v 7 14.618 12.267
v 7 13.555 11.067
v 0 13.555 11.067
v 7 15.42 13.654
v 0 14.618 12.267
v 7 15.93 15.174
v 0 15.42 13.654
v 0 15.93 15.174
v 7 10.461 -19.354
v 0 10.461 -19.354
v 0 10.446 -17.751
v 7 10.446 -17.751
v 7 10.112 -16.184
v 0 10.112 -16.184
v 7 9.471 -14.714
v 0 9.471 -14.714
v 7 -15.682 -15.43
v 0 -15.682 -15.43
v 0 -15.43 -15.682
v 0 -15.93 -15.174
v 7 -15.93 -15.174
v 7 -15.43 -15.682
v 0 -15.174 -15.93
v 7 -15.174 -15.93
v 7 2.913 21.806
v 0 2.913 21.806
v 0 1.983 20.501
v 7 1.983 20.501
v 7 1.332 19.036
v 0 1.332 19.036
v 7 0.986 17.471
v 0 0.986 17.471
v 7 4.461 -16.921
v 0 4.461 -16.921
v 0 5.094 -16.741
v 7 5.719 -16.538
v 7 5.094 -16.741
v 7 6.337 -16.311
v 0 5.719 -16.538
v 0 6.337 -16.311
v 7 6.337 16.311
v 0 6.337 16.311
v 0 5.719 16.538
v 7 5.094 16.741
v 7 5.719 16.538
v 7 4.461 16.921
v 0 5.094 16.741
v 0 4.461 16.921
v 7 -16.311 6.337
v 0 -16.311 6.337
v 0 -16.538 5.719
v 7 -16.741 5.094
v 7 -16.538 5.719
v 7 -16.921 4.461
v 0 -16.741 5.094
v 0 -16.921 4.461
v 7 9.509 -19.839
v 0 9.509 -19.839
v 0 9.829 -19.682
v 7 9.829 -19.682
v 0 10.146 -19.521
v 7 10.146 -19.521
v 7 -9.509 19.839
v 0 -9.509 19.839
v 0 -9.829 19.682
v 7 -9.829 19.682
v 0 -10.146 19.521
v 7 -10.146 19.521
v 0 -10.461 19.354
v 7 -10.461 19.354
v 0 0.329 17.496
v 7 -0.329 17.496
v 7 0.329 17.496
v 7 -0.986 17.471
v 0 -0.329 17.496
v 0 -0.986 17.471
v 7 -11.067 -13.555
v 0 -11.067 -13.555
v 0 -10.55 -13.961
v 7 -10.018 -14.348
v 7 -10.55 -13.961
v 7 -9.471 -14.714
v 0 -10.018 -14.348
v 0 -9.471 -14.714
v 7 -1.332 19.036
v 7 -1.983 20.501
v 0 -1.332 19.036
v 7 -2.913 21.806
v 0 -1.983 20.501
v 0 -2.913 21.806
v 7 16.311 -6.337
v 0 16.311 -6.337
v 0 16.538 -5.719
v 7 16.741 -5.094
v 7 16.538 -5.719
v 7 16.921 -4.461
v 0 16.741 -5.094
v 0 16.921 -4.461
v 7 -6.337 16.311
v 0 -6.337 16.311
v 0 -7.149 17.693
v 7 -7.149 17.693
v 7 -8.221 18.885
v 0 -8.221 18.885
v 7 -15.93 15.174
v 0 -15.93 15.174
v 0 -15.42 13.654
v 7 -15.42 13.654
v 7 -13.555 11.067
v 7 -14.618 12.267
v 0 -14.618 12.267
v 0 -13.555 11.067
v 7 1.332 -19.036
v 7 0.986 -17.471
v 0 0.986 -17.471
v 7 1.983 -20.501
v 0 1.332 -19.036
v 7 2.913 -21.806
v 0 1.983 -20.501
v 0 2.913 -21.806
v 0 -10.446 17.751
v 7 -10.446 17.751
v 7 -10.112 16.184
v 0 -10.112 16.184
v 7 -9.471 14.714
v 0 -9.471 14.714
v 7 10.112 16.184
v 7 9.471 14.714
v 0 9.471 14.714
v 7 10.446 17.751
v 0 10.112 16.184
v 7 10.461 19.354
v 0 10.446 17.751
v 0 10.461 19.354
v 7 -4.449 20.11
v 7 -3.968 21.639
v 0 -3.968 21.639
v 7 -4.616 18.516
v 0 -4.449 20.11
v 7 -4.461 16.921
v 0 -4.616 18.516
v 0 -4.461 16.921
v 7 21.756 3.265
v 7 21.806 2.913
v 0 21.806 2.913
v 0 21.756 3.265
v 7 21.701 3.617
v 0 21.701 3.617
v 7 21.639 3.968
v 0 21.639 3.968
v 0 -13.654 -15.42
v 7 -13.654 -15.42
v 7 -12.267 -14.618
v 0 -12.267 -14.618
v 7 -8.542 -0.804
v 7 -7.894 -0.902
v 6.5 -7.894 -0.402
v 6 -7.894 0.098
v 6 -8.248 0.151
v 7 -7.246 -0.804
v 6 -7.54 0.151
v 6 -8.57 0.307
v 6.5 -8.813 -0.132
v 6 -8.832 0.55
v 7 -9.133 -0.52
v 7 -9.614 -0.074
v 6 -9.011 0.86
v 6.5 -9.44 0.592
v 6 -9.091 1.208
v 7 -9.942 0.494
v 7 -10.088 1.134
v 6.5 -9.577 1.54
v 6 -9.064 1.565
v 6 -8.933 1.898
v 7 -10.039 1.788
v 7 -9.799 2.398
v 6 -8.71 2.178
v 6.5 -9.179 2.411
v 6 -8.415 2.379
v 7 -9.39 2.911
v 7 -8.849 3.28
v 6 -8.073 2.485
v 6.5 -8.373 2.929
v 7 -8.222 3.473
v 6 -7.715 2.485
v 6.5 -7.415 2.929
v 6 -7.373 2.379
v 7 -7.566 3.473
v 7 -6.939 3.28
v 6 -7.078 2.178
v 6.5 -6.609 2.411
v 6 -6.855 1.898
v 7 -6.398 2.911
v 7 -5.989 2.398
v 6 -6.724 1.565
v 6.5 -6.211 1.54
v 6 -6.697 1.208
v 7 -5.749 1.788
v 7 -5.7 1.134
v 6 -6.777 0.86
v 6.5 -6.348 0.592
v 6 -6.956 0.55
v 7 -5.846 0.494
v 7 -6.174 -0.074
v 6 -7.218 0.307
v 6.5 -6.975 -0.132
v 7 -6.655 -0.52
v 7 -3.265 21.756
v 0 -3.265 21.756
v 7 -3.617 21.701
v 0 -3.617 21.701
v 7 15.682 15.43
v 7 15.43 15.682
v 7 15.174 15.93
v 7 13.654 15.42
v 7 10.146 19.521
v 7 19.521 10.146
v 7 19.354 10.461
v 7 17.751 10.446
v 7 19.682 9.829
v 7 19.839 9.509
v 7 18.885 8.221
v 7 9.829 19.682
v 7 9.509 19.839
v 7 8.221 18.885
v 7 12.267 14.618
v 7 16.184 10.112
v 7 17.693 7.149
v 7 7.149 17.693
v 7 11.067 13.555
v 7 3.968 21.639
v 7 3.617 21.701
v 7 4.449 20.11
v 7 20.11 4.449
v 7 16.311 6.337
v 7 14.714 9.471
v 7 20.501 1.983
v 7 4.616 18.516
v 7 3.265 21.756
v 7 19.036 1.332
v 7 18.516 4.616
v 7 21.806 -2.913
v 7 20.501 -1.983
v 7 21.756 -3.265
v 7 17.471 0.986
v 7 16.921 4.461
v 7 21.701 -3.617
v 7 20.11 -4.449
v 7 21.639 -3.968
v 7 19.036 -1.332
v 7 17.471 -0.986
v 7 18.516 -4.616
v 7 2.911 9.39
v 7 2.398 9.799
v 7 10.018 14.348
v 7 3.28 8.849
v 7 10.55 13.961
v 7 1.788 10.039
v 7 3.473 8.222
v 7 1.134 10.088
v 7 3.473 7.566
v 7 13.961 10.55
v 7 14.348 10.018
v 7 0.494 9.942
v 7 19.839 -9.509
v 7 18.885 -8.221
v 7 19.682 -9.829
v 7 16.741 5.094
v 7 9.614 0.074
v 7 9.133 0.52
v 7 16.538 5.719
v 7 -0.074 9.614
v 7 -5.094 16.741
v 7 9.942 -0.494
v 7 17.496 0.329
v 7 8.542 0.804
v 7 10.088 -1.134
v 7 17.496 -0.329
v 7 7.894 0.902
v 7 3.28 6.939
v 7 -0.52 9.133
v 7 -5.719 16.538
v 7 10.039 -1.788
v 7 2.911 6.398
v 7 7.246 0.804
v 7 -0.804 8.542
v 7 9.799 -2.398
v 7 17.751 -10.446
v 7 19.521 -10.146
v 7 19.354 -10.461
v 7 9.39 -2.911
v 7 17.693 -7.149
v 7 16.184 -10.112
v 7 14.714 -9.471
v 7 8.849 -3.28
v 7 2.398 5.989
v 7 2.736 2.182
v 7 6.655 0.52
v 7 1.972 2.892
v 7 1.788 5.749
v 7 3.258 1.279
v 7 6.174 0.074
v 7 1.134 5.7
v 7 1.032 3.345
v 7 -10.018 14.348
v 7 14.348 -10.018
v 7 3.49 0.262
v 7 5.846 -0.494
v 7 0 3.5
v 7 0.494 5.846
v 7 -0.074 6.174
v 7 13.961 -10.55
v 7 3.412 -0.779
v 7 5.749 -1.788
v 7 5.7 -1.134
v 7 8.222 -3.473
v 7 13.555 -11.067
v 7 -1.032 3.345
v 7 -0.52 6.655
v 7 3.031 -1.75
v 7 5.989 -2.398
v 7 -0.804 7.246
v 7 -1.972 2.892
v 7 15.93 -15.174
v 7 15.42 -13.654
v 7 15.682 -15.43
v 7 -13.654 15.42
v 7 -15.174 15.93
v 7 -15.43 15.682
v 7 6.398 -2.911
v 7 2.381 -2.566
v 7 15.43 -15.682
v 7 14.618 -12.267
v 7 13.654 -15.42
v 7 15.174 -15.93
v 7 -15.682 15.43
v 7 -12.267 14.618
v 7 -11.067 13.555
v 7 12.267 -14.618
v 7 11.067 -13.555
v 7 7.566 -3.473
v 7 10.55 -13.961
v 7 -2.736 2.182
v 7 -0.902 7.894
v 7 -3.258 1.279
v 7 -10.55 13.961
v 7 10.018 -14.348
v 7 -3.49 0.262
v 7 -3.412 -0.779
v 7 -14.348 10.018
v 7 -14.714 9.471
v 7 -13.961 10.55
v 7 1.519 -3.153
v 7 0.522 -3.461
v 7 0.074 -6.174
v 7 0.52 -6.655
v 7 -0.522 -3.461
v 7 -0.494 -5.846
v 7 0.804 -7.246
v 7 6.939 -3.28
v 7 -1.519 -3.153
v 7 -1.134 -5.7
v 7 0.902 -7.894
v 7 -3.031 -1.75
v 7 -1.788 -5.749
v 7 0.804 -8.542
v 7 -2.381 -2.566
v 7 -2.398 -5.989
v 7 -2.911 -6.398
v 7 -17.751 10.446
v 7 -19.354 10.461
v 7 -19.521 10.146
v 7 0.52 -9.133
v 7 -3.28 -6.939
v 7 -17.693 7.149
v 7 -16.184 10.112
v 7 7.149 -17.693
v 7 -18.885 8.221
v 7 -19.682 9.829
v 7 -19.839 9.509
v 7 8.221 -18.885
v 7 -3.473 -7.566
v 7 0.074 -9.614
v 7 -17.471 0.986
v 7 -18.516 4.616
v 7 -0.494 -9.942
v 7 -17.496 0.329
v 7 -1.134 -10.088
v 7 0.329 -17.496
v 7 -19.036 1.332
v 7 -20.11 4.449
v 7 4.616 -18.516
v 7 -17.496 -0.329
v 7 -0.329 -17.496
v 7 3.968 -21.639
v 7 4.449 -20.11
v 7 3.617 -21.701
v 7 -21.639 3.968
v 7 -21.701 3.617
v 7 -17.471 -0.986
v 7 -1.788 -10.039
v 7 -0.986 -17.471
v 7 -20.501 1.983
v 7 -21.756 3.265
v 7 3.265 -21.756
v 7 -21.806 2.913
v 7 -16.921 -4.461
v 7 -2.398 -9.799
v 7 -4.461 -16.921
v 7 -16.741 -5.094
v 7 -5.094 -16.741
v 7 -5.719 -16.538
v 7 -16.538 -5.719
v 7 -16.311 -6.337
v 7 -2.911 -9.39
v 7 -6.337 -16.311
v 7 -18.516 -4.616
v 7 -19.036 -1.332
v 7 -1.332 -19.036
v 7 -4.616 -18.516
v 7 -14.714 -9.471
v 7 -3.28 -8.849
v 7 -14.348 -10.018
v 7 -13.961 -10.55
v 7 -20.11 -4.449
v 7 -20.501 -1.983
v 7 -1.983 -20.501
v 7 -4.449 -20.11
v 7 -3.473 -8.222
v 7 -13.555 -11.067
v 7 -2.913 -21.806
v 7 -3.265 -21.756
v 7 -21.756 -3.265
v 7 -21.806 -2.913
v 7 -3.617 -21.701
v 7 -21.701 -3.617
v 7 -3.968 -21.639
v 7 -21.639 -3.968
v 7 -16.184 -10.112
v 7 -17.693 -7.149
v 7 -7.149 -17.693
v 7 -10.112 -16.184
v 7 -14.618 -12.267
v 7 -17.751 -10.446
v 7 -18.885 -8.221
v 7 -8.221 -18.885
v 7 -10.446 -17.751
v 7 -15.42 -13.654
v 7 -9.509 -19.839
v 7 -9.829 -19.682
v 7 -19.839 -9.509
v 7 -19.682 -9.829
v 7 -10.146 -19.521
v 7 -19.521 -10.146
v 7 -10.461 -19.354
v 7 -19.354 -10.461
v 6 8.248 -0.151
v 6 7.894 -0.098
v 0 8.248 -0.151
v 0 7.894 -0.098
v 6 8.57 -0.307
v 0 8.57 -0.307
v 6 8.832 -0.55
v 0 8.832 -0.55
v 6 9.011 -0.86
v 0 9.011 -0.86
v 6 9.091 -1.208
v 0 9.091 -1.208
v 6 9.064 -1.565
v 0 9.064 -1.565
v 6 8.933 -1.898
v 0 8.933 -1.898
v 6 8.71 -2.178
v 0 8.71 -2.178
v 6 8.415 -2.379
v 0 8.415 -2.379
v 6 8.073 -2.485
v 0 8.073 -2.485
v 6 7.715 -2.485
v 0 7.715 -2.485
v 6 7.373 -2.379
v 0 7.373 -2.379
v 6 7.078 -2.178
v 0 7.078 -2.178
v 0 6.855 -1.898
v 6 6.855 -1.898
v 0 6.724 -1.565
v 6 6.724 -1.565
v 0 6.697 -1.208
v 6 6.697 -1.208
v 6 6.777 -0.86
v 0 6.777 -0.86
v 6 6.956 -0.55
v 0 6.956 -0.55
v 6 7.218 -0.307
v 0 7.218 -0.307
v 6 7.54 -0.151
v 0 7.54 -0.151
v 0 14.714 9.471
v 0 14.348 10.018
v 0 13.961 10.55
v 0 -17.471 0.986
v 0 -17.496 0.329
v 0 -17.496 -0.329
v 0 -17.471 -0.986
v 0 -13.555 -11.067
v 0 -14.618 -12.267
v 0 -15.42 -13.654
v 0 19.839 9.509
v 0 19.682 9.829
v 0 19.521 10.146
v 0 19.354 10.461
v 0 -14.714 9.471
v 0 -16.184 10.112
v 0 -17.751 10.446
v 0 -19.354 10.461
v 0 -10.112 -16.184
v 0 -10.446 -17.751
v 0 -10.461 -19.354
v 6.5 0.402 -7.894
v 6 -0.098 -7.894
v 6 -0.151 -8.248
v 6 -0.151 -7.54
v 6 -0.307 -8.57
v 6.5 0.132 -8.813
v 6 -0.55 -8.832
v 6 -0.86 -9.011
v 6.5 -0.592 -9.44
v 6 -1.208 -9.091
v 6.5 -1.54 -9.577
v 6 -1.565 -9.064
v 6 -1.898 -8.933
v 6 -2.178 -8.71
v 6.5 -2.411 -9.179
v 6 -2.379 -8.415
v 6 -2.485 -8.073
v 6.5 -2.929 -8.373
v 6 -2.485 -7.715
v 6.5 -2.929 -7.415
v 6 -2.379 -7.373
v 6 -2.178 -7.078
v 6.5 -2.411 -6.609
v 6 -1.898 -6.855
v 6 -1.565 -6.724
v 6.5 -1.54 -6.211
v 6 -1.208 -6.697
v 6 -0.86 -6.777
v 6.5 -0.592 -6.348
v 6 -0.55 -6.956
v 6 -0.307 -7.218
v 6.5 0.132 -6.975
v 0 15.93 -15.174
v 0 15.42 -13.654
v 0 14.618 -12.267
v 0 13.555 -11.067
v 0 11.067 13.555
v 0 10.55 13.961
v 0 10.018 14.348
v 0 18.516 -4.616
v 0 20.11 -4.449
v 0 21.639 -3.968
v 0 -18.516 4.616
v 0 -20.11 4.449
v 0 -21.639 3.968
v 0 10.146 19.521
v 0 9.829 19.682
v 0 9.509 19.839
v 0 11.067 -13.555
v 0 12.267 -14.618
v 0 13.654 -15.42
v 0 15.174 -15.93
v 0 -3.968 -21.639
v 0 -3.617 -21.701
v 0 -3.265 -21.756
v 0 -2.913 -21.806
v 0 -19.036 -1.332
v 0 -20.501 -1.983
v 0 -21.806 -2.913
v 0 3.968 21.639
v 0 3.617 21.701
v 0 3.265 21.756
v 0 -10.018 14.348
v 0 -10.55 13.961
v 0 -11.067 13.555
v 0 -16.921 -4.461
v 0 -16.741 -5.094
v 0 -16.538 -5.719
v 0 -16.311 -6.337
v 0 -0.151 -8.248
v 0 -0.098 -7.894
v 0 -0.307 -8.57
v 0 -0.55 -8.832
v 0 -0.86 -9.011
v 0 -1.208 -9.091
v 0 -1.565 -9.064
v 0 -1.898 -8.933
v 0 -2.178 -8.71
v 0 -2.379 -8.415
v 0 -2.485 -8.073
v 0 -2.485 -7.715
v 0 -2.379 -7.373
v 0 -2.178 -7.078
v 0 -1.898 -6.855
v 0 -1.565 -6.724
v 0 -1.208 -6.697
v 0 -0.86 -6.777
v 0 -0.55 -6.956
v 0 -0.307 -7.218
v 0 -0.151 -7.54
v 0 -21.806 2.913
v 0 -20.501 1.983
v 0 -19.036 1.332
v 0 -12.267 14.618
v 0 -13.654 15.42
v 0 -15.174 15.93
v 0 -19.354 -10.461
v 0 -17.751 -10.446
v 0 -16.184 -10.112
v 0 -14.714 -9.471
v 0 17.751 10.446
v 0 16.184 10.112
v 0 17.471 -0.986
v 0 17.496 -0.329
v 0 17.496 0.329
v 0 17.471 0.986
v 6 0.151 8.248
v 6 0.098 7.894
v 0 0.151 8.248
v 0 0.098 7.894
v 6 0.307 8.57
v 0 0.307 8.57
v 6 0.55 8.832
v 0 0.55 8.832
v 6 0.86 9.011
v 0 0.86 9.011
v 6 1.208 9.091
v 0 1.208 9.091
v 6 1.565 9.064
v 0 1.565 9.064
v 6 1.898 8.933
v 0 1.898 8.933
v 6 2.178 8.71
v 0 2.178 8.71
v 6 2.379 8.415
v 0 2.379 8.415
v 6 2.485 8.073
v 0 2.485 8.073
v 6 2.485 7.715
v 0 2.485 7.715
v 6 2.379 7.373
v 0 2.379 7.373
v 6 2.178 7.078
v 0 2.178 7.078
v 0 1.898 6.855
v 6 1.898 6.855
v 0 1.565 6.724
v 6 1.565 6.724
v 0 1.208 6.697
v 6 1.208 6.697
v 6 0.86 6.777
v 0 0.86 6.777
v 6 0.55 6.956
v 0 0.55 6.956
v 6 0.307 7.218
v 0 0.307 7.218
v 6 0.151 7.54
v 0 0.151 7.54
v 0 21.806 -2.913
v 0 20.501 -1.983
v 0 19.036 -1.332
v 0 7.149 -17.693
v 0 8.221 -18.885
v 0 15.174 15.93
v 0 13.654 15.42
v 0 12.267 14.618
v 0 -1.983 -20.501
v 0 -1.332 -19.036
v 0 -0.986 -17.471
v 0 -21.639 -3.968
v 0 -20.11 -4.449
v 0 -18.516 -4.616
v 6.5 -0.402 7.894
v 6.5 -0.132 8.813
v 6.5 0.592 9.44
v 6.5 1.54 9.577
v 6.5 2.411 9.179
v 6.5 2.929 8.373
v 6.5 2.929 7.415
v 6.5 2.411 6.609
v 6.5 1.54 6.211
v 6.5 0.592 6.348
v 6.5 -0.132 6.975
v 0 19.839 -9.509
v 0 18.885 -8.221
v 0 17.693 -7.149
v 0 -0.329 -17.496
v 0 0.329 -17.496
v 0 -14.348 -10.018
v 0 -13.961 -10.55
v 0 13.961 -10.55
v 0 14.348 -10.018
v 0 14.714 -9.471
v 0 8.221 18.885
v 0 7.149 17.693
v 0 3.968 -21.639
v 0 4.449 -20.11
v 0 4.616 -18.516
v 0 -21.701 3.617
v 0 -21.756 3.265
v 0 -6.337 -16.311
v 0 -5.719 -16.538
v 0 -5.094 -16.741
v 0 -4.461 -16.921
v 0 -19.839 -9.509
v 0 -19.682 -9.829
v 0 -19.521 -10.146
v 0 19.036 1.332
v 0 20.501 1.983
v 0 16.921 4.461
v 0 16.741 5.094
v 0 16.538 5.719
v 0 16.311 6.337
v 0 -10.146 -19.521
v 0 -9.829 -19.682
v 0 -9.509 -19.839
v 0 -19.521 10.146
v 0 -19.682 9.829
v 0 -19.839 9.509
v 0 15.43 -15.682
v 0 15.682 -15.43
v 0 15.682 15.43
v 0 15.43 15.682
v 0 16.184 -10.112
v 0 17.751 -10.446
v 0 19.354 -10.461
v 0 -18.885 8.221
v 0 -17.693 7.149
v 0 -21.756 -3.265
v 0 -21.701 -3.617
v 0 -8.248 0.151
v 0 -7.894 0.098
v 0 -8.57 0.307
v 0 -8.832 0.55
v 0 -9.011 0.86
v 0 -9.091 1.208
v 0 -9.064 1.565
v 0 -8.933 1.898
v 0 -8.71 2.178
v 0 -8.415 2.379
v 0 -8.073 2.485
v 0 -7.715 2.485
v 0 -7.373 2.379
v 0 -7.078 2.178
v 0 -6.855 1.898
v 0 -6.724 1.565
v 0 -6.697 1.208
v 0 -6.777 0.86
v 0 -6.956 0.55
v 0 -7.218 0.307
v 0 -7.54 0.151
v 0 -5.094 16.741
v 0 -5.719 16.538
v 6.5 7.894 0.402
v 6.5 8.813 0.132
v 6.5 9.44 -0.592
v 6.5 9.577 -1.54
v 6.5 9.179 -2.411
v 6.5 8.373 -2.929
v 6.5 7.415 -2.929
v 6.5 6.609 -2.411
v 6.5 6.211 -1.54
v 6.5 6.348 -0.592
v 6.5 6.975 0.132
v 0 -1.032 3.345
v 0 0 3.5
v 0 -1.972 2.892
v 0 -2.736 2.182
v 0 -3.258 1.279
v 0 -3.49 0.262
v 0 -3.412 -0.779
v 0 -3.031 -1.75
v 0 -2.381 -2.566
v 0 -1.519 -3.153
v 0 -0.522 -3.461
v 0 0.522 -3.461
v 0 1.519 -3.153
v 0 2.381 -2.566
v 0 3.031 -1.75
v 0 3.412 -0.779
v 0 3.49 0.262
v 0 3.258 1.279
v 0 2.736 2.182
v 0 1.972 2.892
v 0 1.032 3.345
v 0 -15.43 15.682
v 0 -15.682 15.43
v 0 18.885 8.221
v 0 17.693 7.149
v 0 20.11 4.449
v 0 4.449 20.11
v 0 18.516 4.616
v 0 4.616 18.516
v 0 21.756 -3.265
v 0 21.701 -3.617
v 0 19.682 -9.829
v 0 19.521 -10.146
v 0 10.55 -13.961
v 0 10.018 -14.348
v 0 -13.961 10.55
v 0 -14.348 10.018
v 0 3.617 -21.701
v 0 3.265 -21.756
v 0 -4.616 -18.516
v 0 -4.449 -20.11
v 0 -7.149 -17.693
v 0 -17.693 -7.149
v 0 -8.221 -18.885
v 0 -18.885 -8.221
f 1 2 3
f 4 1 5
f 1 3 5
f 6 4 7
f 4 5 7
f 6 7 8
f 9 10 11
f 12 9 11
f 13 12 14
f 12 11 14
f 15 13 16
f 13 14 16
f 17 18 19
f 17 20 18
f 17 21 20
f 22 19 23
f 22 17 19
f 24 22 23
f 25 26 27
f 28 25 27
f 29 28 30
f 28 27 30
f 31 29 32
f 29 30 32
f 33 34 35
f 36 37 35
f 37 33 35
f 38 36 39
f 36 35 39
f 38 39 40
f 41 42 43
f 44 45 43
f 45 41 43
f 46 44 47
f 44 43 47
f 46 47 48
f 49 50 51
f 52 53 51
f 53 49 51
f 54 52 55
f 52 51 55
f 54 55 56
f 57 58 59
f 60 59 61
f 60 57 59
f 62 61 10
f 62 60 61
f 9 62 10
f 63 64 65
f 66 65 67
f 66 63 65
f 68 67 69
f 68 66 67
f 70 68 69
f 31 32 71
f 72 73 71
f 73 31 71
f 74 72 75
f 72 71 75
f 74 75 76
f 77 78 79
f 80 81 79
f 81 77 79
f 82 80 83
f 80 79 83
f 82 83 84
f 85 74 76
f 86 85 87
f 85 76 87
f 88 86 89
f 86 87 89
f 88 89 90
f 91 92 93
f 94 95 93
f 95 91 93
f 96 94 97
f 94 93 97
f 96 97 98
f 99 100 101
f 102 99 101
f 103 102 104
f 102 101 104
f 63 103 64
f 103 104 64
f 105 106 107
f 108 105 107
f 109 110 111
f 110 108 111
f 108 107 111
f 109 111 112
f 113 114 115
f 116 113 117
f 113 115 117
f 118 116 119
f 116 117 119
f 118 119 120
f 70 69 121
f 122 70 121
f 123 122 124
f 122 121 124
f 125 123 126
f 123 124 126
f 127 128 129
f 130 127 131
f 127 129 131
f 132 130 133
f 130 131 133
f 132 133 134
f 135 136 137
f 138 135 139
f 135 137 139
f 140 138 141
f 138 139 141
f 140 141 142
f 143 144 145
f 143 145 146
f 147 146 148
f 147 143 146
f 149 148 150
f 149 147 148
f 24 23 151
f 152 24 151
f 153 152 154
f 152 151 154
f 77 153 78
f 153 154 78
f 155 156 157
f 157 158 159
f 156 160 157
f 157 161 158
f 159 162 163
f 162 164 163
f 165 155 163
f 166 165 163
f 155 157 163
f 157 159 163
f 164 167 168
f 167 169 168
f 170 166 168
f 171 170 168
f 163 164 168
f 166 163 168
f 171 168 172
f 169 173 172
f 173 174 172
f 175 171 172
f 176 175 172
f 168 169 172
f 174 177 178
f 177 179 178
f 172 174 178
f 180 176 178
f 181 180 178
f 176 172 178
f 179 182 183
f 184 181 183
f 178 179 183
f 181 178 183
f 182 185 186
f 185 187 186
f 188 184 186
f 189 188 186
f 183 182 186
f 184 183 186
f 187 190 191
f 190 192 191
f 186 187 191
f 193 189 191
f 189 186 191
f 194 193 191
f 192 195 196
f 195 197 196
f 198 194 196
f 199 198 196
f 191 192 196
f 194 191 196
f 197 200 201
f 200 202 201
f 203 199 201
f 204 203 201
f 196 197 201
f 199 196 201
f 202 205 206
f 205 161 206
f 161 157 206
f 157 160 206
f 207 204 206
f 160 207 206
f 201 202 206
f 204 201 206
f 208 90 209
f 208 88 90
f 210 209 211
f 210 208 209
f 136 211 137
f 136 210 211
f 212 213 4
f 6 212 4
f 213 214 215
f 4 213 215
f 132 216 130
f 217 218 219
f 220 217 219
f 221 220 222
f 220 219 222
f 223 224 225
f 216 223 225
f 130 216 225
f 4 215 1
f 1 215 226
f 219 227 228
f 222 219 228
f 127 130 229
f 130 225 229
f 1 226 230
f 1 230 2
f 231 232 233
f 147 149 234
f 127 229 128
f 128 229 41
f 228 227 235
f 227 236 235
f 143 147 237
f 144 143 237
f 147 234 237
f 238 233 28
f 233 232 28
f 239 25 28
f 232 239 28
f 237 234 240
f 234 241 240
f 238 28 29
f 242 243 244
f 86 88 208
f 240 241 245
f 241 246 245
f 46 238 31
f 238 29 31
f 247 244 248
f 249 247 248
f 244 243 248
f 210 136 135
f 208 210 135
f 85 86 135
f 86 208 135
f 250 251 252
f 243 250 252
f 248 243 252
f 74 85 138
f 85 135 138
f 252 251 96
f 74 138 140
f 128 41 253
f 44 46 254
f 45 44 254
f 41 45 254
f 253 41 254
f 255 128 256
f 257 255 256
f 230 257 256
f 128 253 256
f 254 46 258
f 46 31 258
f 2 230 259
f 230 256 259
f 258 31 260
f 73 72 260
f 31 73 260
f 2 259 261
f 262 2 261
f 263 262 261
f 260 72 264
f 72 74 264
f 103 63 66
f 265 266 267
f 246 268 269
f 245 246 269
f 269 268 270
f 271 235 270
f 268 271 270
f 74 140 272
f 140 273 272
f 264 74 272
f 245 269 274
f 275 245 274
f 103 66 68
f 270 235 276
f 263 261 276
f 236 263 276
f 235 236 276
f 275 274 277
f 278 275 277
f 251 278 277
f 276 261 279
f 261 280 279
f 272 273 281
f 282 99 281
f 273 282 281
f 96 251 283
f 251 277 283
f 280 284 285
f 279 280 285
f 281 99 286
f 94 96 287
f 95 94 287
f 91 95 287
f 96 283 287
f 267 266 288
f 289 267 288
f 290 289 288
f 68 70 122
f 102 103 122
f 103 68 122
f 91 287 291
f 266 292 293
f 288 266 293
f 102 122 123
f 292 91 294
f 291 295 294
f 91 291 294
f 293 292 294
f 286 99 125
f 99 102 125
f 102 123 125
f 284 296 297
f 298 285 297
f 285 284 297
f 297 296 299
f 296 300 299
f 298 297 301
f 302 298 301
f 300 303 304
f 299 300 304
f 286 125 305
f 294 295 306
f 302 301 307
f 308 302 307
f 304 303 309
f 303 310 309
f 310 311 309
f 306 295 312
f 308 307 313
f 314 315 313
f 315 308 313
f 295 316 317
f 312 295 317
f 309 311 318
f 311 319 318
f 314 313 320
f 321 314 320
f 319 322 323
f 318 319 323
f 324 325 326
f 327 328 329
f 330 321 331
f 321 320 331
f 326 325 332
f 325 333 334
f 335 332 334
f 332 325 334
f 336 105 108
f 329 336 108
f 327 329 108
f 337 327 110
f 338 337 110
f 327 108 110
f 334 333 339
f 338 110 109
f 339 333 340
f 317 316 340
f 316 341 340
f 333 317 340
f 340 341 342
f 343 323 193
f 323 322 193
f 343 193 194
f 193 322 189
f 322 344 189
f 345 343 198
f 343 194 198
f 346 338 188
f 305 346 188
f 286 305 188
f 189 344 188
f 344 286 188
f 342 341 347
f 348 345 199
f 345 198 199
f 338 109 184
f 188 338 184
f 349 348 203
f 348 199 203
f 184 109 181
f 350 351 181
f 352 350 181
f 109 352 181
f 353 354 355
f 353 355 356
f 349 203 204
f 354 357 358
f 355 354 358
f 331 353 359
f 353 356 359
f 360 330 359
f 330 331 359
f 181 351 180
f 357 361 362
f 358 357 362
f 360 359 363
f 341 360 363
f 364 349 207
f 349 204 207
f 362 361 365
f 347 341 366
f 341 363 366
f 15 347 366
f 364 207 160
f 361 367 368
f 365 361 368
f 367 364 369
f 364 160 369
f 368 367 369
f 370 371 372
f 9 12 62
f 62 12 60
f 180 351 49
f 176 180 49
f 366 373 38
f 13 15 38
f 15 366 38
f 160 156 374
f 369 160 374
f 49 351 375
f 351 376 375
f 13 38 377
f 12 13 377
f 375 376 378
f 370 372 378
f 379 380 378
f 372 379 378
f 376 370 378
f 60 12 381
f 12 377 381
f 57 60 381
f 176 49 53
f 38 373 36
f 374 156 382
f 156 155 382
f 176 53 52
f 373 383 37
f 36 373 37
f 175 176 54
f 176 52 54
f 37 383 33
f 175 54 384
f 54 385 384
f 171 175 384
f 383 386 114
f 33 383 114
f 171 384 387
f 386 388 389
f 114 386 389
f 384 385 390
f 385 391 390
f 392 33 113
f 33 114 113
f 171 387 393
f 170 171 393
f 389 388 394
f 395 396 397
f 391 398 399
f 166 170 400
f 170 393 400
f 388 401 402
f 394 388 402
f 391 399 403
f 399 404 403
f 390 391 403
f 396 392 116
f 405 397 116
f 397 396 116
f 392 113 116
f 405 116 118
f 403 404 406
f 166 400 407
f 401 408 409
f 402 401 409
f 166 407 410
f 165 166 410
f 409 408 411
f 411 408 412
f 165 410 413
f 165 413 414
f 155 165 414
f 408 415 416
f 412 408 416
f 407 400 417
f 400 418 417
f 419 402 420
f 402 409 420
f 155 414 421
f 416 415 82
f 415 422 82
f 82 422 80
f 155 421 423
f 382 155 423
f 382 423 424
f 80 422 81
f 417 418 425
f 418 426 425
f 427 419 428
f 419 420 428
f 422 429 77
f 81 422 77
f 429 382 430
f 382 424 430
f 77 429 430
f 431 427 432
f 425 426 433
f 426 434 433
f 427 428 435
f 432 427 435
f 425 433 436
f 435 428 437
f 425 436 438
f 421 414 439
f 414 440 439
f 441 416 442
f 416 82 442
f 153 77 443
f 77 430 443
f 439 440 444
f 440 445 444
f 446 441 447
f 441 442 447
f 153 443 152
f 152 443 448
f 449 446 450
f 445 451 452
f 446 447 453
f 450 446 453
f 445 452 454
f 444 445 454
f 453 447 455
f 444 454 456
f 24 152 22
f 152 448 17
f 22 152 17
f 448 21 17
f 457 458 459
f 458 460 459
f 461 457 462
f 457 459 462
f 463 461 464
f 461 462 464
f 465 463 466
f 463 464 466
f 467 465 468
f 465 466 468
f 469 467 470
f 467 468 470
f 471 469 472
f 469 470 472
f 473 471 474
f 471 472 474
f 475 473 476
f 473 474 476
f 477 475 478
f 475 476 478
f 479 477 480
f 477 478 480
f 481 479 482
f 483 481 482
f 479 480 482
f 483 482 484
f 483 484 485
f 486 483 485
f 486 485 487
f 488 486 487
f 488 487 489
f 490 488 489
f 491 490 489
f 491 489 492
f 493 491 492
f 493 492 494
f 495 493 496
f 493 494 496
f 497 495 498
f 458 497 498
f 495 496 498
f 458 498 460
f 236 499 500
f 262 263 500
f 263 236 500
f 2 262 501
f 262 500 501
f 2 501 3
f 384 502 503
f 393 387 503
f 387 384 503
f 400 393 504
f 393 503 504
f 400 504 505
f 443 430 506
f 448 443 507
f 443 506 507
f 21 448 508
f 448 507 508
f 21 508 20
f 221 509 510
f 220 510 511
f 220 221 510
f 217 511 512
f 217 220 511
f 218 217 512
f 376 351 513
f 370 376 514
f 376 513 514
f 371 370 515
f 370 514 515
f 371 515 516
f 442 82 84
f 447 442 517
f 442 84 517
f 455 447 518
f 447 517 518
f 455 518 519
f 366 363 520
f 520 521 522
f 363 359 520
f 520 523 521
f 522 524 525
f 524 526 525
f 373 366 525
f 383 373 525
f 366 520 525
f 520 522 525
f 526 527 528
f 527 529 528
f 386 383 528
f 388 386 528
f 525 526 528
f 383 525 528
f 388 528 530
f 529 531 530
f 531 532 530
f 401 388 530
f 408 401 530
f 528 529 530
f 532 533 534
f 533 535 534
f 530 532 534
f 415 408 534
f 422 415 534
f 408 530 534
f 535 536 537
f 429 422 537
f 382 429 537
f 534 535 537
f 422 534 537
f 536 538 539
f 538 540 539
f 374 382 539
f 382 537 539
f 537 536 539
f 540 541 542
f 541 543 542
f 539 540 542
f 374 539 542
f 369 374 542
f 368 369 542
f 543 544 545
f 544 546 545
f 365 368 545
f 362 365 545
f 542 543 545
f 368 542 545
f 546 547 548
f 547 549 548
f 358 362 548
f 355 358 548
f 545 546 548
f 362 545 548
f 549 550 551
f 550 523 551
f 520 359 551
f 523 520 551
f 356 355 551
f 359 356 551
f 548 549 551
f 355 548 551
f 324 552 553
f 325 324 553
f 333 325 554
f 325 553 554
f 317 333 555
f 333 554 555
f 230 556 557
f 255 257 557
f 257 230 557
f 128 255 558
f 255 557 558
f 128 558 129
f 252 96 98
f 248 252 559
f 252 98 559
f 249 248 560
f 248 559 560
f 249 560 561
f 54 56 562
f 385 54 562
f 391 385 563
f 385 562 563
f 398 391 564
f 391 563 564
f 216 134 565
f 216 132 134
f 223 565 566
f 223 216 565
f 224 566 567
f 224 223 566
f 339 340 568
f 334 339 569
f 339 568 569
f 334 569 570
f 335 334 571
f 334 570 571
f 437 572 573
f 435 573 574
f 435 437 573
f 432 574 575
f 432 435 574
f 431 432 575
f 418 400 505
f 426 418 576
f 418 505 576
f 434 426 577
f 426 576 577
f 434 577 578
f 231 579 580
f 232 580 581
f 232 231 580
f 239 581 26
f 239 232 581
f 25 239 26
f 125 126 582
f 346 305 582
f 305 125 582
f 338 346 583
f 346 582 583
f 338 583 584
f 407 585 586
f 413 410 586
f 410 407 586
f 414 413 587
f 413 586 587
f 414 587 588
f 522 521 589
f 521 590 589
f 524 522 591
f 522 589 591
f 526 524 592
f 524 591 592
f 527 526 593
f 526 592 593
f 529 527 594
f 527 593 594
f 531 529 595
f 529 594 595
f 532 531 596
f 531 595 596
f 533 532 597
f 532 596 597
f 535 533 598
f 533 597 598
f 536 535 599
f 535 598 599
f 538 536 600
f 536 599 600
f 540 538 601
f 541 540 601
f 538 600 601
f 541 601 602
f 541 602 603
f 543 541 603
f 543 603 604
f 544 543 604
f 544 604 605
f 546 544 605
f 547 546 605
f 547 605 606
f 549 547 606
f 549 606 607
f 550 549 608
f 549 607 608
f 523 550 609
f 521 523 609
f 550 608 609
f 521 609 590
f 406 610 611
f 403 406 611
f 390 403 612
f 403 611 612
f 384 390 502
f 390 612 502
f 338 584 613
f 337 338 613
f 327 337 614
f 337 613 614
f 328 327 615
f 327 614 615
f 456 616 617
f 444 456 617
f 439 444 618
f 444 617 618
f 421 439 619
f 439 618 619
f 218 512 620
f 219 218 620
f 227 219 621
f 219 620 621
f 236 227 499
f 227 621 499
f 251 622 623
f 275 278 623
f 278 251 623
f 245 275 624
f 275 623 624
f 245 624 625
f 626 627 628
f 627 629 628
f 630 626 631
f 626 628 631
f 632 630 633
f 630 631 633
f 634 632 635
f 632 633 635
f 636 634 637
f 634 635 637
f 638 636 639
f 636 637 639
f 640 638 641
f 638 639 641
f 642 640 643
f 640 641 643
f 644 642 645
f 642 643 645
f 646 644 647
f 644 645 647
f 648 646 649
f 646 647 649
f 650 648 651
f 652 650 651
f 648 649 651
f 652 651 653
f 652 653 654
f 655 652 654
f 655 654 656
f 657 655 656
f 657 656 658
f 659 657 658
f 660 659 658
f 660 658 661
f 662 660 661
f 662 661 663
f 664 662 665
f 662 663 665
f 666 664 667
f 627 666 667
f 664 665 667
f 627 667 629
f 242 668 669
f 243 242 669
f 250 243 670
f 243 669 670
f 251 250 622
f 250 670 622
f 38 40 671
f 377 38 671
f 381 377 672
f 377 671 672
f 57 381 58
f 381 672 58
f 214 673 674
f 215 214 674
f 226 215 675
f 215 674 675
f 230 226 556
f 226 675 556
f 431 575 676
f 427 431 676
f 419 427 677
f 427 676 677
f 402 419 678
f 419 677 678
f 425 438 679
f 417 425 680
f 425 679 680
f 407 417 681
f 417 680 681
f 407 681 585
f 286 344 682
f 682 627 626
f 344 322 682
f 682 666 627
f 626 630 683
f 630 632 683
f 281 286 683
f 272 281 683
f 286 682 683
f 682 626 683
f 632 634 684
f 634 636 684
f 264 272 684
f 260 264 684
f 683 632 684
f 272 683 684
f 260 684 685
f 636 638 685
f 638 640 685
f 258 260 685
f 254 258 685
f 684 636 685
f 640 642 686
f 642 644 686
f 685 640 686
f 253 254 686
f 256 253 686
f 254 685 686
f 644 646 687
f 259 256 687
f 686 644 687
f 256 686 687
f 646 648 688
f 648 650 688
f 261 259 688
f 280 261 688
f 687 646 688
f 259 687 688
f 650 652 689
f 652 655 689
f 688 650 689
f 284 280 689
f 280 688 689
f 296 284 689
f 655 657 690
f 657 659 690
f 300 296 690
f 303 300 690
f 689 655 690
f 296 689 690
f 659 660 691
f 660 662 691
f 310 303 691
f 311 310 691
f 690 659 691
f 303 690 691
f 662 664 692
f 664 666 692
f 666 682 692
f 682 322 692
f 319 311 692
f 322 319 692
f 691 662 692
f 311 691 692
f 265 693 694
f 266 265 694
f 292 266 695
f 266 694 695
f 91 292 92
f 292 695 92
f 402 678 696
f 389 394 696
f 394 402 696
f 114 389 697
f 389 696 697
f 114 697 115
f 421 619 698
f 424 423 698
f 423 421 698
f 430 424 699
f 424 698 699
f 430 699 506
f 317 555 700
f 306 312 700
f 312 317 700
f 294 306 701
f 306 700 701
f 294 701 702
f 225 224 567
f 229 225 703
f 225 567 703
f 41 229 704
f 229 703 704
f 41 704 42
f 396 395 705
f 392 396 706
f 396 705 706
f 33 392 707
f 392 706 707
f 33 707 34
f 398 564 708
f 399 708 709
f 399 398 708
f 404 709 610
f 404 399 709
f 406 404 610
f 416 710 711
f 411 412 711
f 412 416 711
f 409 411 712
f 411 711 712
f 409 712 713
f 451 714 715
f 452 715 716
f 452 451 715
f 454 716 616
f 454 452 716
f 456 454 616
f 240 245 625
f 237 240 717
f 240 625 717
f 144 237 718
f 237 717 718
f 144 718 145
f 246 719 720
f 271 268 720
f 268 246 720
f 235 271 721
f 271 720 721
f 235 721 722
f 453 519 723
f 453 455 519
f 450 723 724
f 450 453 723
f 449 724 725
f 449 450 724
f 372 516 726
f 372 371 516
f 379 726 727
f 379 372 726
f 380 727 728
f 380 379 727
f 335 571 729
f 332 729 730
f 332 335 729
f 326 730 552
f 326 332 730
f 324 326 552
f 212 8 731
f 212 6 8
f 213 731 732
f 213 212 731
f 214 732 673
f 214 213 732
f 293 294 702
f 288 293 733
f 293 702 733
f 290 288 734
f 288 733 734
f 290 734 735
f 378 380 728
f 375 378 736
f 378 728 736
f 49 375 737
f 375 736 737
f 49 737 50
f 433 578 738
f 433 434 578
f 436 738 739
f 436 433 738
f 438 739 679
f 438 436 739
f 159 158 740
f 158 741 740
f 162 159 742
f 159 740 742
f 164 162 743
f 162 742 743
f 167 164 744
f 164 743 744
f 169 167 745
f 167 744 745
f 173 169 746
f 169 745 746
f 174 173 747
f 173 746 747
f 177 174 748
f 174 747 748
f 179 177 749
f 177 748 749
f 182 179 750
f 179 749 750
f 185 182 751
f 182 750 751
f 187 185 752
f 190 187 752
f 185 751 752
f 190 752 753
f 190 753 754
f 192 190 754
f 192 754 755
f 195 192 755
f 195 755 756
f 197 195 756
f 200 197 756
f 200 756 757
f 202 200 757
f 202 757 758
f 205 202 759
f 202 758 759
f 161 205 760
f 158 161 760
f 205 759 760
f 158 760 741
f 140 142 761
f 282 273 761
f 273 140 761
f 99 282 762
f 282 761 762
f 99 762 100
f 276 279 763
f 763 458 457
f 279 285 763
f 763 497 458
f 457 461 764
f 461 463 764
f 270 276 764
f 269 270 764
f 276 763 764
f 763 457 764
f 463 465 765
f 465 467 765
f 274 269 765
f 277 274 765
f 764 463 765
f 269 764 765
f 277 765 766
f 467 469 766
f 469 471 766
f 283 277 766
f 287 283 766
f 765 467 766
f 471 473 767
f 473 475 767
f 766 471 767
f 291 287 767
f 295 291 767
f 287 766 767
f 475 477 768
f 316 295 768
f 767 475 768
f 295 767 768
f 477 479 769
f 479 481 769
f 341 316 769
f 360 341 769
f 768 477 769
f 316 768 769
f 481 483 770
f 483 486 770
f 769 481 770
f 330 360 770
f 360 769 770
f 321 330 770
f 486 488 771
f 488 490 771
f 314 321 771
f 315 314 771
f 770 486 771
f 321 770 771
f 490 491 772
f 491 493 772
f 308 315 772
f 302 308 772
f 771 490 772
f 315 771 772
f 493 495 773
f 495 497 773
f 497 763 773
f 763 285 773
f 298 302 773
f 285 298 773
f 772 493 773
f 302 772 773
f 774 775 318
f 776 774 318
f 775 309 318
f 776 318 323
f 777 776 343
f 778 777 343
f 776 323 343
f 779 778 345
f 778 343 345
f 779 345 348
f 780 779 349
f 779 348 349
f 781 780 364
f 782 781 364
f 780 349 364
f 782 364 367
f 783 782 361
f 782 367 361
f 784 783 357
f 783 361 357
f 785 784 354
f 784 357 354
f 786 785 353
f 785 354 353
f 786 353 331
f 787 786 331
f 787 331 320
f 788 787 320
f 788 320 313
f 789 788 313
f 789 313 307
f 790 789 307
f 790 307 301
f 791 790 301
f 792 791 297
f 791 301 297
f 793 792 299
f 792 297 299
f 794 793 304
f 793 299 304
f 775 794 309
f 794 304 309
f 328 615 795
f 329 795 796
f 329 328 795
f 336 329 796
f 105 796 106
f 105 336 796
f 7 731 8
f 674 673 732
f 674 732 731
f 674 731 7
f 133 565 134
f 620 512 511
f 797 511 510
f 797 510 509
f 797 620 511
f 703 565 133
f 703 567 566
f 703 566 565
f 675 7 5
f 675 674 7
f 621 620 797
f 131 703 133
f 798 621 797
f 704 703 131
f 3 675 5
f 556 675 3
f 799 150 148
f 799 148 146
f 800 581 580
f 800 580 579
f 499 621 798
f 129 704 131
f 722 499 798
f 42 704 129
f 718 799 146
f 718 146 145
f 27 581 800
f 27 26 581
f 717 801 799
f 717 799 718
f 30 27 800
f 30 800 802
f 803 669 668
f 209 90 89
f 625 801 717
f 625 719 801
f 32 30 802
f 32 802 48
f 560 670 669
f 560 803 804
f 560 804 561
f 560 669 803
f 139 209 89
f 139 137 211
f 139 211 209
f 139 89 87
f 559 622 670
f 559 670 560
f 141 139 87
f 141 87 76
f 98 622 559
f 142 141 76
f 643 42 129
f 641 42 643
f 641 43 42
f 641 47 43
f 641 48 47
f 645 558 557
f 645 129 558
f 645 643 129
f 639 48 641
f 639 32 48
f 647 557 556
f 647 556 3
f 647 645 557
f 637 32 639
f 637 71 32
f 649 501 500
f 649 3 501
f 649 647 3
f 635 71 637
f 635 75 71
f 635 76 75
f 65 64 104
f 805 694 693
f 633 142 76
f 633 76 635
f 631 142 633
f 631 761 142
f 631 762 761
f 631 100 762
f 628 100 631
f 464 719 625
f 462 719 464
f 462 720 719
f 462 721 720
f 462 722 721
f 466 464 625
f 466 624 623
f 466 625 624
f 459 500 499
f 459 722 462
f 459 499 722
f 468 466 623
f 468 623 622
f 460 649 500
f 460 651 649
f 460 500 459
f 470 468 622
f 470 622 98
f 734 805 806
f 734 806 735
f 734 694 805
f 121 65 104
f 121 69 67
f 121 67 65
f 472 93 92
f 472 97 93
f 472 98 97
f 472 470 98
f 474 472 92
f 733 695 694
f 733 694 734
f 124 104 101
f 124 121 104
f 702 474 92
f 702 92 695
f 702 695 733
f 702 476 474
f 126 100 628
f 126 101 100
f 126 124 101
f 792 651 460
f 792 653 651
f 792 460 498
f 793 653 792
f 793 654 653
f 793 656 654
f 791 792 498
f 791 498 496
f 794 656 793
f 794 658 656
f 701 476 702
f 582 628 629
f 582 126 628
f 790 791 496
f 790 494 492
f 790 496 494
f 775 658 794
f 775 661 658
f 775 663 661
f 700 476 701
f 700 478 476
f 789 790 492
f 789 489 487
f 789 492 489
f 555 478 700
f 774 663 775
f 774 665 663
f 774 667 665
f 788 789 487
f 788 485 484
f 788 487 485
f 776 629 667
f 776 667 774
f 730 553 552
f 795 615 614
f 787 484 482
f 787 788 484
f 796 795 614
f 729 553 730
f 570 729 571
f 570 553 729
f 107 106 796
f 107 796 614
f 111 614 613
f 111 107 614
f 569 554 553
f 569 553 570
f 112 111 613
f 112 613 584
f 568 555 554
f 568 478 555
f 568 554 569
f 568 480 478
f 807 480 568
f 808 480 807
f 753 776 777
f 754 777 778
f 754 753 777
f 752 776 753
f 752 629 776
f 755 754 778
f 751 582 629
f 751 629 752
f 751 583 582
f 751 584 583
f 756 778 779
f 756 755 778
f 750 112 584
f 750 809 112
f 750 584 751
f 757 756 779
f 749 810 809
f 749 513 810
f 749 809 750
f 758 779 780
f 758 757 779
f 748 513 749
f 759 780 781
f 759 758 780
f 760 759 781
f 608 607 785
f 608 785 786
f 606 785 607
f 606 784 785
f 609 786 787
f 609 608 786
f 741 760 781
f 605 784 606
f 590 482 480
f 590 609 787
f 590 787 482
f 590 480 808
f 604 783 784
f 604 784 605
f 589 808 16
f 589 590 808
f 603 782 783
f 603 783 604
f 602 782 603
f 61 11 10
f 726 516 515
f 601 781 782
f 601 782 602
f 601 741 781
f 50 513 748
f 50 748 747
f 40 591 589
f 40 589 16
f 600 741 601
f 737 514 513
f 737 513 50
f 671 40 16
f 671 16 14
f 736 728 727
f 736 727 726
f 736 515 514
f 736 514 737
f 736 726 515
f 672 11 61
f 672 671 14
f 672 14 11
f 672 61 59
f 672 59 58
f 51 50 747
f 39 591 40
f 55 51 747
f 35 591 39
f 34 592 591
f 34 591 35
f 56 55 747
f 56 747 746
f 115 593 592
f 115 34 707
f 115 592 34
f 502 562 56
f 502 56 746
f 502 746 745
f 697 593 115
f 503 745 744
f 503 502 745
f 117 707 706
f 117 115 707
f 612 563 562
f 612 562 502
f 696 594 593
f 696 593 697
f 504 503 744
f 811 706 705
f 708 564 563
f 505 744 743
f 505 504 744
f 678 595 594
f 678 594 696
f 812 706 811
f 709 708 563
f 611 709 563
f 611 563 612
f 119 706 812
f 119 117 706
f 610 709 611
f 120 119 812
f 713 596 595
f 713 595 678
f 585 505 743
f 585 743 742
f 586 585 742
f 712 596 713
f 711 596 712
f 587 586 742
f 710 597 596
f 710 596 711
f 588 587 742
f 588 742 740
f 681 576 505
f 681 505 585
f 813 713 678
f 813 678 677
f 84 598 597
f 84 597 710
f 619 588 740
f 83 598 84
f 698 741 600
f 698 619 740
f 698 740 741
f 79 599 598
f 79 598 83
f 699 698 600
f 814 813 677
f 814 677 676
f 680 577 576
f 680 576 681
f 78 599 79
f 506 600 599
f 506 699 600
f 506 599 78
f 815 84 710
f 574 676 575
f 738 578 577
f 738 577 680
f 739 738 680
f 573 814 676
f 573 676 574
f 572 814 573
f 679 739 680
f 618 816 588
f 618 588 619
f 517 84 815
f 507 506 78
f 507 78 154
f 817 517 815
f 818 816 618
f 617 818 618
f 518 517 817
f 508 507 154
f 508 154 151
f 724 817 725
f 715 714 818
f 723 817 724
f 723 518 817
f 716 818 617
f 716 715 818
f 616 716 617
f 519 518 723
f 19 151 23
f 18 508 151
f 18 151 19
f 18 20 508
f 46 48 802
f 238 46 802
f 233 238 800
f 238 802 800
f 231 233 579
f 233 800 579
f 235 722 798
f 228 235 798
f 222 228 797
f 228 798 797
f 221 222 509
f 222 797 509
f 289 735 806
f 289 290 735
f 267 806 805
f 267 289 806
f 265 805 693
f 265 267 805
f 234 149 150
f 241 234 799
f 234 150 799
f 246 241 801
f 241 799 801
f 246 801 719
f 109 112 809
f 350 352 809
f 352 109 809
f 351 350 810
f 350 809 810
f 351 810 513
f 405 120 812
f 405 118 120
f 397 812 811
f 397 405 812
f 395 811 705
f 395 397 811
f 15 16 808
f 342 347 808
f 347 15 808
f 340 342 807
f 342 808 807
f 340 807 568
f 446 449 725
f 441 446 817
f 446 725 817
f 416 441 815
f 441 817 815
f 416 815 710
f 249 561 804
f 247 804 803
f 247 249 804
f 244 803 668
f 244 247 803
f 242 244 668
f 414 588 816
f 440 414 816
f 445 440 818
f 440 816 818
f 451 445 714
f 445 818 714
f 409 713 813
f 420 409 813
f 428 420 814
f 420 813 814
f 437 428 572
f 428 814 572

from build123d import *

# Parameters (mm, degrees)
BASPROSKE_W                                    = 7
BASPROSKE_H                                    = 22
TOOTHCUT_DEPTH                                 = 32.890437438
TEETHCUTS_COUNT                                = 20
TEETHCUTS_ANGLE                                = 342
BORSKE_R                                       = 3.5
BORE_DEPTH                                     = 50.0000508
FRAISAGE_POUR_VIS_T_TE_FRAIS_E_M21_D           = 2.4
FRAISAGE_POUR_VIS_T_TE_FRAIS_E_M21_CSINK_D     = 4.4
FRAISAGE_POUR_VIS_T_TE_FRAIS_E_M21_CSINK_ANGLE = 90
R_P_TITION_CIRCULAIRE1_COUNT                   = 4


with BuildPart() as part:
    # BasProSke → Base-Revolve (revolve)
    with BuildSketch(Plane(origin=(0, 0, 0), x_dir=(1, 0, 0), z_dir=(0, 1, 0)), mode=Mode.PRIVATE) as base_revolve_sk:
        with Locations((3.5, 11)):
            Rectangle(BASPROSKE_W, BASPROSKE_H)
    revolve(base_revolve_sk.sketch.rotate(Axis((-10, 0, 0), (1, 0, 0)), 180), axis=Axis((-10, 0, 0), (1, 0, 0)))

    # TooCutSke → ToothCut (cut, through all)
    with BuildSketch(Plane(origin=(0, 0, 0), x_dir=(0, 0, -1), z_dir=(1, 0, 0))):
        with BuildLine():
            ThreePointArc((0.986171591, 17.471189616), (0, 17.499), (-0.986171591, 17.471189616))
            ThreePointArc((-0.986171591, 17.471189616), (-1.626916196, 19.798789858), (-2.932850173, 21.829260982))
            ThreePointArc((-2.932850173, 21.829260982), (0, 22.0254), (2.932850173, 21.829260982))
            ThreePointArc((2.932850173, 21.829260982), (1.626916196, 19.798789858), (0.986171591, 17.471189616))
        make_face()
    toothcut = extrude(amount=TOOTHCUT_DEPTH, mode=Mode.SUBTRACT)

    # TeethCuts: ToothCut ×20 about axis
    teethcuts_axis = Axis((-10, 0, 0), (1, 0, 0))
    for i in range(1, TEETHCUTS_COUNT):
        add(toothcut.rotate(teethcuts_axis, i * TEETHCUTS_ANGLE / (TEETHCUTS_COUNT - 1)), mode=Mode.SUBTRACT)

    # BorSke → Bore (cut, symmetric)
    with BuildSketch(Plane(origin=(0, 0, 0), x_dir=(0, 0, -1), z_dir=(1, 0, 0))):
        with Locations(Location((0, 0, 0), (0, 0, 180))):
            Circle(BORSKE_R)
    extrude(amount=BORE_DEPTH, both=True, mode=Mode.SUBTRACT)

    # Fraisage pour vis à tête fraisée M21 (through all)
    with Locations(Plane(origin=(7, 0, 0), x_dir=(0, 0, -1), z_dir=(1, 0, 0))):
        with Locations((1.298006129, 7.893996459)):
            fraisage_pour_vis_t_te_frais_e_m21 = CounterSinkHole(FRAISAGE_POUR_VIS_T_TE_FRAIS_E_M21_D / 2, FRAISAGE_POUR_VIS_T_TE_FRAIS_E_M21_CSINK_D / 2, counter_sink_angle=FRAISAGE_POUR_VIS_T_TE_FRAIS_E_M21_CSINK_ANGLE)

    # Répétition circulaire1: Fraisage pour vis à tête fraisée M21 ×4 about axis
    r_p_tition_circulaire1_axis = Axis((0, 0, 0), (1, 0, 0))
    for i in range(1, R_P_TITION_CIRCULAIRE1_COUNT):
        add(fraisage_pour_vis_t_te_frais_e_m21.rotate(r_p_tition_circulaire1_axis, i * 360 / R_P_TITION_CIRCULAIRE1_COUNT), mode=Mode.SUBTRACT)


solid = part.part
